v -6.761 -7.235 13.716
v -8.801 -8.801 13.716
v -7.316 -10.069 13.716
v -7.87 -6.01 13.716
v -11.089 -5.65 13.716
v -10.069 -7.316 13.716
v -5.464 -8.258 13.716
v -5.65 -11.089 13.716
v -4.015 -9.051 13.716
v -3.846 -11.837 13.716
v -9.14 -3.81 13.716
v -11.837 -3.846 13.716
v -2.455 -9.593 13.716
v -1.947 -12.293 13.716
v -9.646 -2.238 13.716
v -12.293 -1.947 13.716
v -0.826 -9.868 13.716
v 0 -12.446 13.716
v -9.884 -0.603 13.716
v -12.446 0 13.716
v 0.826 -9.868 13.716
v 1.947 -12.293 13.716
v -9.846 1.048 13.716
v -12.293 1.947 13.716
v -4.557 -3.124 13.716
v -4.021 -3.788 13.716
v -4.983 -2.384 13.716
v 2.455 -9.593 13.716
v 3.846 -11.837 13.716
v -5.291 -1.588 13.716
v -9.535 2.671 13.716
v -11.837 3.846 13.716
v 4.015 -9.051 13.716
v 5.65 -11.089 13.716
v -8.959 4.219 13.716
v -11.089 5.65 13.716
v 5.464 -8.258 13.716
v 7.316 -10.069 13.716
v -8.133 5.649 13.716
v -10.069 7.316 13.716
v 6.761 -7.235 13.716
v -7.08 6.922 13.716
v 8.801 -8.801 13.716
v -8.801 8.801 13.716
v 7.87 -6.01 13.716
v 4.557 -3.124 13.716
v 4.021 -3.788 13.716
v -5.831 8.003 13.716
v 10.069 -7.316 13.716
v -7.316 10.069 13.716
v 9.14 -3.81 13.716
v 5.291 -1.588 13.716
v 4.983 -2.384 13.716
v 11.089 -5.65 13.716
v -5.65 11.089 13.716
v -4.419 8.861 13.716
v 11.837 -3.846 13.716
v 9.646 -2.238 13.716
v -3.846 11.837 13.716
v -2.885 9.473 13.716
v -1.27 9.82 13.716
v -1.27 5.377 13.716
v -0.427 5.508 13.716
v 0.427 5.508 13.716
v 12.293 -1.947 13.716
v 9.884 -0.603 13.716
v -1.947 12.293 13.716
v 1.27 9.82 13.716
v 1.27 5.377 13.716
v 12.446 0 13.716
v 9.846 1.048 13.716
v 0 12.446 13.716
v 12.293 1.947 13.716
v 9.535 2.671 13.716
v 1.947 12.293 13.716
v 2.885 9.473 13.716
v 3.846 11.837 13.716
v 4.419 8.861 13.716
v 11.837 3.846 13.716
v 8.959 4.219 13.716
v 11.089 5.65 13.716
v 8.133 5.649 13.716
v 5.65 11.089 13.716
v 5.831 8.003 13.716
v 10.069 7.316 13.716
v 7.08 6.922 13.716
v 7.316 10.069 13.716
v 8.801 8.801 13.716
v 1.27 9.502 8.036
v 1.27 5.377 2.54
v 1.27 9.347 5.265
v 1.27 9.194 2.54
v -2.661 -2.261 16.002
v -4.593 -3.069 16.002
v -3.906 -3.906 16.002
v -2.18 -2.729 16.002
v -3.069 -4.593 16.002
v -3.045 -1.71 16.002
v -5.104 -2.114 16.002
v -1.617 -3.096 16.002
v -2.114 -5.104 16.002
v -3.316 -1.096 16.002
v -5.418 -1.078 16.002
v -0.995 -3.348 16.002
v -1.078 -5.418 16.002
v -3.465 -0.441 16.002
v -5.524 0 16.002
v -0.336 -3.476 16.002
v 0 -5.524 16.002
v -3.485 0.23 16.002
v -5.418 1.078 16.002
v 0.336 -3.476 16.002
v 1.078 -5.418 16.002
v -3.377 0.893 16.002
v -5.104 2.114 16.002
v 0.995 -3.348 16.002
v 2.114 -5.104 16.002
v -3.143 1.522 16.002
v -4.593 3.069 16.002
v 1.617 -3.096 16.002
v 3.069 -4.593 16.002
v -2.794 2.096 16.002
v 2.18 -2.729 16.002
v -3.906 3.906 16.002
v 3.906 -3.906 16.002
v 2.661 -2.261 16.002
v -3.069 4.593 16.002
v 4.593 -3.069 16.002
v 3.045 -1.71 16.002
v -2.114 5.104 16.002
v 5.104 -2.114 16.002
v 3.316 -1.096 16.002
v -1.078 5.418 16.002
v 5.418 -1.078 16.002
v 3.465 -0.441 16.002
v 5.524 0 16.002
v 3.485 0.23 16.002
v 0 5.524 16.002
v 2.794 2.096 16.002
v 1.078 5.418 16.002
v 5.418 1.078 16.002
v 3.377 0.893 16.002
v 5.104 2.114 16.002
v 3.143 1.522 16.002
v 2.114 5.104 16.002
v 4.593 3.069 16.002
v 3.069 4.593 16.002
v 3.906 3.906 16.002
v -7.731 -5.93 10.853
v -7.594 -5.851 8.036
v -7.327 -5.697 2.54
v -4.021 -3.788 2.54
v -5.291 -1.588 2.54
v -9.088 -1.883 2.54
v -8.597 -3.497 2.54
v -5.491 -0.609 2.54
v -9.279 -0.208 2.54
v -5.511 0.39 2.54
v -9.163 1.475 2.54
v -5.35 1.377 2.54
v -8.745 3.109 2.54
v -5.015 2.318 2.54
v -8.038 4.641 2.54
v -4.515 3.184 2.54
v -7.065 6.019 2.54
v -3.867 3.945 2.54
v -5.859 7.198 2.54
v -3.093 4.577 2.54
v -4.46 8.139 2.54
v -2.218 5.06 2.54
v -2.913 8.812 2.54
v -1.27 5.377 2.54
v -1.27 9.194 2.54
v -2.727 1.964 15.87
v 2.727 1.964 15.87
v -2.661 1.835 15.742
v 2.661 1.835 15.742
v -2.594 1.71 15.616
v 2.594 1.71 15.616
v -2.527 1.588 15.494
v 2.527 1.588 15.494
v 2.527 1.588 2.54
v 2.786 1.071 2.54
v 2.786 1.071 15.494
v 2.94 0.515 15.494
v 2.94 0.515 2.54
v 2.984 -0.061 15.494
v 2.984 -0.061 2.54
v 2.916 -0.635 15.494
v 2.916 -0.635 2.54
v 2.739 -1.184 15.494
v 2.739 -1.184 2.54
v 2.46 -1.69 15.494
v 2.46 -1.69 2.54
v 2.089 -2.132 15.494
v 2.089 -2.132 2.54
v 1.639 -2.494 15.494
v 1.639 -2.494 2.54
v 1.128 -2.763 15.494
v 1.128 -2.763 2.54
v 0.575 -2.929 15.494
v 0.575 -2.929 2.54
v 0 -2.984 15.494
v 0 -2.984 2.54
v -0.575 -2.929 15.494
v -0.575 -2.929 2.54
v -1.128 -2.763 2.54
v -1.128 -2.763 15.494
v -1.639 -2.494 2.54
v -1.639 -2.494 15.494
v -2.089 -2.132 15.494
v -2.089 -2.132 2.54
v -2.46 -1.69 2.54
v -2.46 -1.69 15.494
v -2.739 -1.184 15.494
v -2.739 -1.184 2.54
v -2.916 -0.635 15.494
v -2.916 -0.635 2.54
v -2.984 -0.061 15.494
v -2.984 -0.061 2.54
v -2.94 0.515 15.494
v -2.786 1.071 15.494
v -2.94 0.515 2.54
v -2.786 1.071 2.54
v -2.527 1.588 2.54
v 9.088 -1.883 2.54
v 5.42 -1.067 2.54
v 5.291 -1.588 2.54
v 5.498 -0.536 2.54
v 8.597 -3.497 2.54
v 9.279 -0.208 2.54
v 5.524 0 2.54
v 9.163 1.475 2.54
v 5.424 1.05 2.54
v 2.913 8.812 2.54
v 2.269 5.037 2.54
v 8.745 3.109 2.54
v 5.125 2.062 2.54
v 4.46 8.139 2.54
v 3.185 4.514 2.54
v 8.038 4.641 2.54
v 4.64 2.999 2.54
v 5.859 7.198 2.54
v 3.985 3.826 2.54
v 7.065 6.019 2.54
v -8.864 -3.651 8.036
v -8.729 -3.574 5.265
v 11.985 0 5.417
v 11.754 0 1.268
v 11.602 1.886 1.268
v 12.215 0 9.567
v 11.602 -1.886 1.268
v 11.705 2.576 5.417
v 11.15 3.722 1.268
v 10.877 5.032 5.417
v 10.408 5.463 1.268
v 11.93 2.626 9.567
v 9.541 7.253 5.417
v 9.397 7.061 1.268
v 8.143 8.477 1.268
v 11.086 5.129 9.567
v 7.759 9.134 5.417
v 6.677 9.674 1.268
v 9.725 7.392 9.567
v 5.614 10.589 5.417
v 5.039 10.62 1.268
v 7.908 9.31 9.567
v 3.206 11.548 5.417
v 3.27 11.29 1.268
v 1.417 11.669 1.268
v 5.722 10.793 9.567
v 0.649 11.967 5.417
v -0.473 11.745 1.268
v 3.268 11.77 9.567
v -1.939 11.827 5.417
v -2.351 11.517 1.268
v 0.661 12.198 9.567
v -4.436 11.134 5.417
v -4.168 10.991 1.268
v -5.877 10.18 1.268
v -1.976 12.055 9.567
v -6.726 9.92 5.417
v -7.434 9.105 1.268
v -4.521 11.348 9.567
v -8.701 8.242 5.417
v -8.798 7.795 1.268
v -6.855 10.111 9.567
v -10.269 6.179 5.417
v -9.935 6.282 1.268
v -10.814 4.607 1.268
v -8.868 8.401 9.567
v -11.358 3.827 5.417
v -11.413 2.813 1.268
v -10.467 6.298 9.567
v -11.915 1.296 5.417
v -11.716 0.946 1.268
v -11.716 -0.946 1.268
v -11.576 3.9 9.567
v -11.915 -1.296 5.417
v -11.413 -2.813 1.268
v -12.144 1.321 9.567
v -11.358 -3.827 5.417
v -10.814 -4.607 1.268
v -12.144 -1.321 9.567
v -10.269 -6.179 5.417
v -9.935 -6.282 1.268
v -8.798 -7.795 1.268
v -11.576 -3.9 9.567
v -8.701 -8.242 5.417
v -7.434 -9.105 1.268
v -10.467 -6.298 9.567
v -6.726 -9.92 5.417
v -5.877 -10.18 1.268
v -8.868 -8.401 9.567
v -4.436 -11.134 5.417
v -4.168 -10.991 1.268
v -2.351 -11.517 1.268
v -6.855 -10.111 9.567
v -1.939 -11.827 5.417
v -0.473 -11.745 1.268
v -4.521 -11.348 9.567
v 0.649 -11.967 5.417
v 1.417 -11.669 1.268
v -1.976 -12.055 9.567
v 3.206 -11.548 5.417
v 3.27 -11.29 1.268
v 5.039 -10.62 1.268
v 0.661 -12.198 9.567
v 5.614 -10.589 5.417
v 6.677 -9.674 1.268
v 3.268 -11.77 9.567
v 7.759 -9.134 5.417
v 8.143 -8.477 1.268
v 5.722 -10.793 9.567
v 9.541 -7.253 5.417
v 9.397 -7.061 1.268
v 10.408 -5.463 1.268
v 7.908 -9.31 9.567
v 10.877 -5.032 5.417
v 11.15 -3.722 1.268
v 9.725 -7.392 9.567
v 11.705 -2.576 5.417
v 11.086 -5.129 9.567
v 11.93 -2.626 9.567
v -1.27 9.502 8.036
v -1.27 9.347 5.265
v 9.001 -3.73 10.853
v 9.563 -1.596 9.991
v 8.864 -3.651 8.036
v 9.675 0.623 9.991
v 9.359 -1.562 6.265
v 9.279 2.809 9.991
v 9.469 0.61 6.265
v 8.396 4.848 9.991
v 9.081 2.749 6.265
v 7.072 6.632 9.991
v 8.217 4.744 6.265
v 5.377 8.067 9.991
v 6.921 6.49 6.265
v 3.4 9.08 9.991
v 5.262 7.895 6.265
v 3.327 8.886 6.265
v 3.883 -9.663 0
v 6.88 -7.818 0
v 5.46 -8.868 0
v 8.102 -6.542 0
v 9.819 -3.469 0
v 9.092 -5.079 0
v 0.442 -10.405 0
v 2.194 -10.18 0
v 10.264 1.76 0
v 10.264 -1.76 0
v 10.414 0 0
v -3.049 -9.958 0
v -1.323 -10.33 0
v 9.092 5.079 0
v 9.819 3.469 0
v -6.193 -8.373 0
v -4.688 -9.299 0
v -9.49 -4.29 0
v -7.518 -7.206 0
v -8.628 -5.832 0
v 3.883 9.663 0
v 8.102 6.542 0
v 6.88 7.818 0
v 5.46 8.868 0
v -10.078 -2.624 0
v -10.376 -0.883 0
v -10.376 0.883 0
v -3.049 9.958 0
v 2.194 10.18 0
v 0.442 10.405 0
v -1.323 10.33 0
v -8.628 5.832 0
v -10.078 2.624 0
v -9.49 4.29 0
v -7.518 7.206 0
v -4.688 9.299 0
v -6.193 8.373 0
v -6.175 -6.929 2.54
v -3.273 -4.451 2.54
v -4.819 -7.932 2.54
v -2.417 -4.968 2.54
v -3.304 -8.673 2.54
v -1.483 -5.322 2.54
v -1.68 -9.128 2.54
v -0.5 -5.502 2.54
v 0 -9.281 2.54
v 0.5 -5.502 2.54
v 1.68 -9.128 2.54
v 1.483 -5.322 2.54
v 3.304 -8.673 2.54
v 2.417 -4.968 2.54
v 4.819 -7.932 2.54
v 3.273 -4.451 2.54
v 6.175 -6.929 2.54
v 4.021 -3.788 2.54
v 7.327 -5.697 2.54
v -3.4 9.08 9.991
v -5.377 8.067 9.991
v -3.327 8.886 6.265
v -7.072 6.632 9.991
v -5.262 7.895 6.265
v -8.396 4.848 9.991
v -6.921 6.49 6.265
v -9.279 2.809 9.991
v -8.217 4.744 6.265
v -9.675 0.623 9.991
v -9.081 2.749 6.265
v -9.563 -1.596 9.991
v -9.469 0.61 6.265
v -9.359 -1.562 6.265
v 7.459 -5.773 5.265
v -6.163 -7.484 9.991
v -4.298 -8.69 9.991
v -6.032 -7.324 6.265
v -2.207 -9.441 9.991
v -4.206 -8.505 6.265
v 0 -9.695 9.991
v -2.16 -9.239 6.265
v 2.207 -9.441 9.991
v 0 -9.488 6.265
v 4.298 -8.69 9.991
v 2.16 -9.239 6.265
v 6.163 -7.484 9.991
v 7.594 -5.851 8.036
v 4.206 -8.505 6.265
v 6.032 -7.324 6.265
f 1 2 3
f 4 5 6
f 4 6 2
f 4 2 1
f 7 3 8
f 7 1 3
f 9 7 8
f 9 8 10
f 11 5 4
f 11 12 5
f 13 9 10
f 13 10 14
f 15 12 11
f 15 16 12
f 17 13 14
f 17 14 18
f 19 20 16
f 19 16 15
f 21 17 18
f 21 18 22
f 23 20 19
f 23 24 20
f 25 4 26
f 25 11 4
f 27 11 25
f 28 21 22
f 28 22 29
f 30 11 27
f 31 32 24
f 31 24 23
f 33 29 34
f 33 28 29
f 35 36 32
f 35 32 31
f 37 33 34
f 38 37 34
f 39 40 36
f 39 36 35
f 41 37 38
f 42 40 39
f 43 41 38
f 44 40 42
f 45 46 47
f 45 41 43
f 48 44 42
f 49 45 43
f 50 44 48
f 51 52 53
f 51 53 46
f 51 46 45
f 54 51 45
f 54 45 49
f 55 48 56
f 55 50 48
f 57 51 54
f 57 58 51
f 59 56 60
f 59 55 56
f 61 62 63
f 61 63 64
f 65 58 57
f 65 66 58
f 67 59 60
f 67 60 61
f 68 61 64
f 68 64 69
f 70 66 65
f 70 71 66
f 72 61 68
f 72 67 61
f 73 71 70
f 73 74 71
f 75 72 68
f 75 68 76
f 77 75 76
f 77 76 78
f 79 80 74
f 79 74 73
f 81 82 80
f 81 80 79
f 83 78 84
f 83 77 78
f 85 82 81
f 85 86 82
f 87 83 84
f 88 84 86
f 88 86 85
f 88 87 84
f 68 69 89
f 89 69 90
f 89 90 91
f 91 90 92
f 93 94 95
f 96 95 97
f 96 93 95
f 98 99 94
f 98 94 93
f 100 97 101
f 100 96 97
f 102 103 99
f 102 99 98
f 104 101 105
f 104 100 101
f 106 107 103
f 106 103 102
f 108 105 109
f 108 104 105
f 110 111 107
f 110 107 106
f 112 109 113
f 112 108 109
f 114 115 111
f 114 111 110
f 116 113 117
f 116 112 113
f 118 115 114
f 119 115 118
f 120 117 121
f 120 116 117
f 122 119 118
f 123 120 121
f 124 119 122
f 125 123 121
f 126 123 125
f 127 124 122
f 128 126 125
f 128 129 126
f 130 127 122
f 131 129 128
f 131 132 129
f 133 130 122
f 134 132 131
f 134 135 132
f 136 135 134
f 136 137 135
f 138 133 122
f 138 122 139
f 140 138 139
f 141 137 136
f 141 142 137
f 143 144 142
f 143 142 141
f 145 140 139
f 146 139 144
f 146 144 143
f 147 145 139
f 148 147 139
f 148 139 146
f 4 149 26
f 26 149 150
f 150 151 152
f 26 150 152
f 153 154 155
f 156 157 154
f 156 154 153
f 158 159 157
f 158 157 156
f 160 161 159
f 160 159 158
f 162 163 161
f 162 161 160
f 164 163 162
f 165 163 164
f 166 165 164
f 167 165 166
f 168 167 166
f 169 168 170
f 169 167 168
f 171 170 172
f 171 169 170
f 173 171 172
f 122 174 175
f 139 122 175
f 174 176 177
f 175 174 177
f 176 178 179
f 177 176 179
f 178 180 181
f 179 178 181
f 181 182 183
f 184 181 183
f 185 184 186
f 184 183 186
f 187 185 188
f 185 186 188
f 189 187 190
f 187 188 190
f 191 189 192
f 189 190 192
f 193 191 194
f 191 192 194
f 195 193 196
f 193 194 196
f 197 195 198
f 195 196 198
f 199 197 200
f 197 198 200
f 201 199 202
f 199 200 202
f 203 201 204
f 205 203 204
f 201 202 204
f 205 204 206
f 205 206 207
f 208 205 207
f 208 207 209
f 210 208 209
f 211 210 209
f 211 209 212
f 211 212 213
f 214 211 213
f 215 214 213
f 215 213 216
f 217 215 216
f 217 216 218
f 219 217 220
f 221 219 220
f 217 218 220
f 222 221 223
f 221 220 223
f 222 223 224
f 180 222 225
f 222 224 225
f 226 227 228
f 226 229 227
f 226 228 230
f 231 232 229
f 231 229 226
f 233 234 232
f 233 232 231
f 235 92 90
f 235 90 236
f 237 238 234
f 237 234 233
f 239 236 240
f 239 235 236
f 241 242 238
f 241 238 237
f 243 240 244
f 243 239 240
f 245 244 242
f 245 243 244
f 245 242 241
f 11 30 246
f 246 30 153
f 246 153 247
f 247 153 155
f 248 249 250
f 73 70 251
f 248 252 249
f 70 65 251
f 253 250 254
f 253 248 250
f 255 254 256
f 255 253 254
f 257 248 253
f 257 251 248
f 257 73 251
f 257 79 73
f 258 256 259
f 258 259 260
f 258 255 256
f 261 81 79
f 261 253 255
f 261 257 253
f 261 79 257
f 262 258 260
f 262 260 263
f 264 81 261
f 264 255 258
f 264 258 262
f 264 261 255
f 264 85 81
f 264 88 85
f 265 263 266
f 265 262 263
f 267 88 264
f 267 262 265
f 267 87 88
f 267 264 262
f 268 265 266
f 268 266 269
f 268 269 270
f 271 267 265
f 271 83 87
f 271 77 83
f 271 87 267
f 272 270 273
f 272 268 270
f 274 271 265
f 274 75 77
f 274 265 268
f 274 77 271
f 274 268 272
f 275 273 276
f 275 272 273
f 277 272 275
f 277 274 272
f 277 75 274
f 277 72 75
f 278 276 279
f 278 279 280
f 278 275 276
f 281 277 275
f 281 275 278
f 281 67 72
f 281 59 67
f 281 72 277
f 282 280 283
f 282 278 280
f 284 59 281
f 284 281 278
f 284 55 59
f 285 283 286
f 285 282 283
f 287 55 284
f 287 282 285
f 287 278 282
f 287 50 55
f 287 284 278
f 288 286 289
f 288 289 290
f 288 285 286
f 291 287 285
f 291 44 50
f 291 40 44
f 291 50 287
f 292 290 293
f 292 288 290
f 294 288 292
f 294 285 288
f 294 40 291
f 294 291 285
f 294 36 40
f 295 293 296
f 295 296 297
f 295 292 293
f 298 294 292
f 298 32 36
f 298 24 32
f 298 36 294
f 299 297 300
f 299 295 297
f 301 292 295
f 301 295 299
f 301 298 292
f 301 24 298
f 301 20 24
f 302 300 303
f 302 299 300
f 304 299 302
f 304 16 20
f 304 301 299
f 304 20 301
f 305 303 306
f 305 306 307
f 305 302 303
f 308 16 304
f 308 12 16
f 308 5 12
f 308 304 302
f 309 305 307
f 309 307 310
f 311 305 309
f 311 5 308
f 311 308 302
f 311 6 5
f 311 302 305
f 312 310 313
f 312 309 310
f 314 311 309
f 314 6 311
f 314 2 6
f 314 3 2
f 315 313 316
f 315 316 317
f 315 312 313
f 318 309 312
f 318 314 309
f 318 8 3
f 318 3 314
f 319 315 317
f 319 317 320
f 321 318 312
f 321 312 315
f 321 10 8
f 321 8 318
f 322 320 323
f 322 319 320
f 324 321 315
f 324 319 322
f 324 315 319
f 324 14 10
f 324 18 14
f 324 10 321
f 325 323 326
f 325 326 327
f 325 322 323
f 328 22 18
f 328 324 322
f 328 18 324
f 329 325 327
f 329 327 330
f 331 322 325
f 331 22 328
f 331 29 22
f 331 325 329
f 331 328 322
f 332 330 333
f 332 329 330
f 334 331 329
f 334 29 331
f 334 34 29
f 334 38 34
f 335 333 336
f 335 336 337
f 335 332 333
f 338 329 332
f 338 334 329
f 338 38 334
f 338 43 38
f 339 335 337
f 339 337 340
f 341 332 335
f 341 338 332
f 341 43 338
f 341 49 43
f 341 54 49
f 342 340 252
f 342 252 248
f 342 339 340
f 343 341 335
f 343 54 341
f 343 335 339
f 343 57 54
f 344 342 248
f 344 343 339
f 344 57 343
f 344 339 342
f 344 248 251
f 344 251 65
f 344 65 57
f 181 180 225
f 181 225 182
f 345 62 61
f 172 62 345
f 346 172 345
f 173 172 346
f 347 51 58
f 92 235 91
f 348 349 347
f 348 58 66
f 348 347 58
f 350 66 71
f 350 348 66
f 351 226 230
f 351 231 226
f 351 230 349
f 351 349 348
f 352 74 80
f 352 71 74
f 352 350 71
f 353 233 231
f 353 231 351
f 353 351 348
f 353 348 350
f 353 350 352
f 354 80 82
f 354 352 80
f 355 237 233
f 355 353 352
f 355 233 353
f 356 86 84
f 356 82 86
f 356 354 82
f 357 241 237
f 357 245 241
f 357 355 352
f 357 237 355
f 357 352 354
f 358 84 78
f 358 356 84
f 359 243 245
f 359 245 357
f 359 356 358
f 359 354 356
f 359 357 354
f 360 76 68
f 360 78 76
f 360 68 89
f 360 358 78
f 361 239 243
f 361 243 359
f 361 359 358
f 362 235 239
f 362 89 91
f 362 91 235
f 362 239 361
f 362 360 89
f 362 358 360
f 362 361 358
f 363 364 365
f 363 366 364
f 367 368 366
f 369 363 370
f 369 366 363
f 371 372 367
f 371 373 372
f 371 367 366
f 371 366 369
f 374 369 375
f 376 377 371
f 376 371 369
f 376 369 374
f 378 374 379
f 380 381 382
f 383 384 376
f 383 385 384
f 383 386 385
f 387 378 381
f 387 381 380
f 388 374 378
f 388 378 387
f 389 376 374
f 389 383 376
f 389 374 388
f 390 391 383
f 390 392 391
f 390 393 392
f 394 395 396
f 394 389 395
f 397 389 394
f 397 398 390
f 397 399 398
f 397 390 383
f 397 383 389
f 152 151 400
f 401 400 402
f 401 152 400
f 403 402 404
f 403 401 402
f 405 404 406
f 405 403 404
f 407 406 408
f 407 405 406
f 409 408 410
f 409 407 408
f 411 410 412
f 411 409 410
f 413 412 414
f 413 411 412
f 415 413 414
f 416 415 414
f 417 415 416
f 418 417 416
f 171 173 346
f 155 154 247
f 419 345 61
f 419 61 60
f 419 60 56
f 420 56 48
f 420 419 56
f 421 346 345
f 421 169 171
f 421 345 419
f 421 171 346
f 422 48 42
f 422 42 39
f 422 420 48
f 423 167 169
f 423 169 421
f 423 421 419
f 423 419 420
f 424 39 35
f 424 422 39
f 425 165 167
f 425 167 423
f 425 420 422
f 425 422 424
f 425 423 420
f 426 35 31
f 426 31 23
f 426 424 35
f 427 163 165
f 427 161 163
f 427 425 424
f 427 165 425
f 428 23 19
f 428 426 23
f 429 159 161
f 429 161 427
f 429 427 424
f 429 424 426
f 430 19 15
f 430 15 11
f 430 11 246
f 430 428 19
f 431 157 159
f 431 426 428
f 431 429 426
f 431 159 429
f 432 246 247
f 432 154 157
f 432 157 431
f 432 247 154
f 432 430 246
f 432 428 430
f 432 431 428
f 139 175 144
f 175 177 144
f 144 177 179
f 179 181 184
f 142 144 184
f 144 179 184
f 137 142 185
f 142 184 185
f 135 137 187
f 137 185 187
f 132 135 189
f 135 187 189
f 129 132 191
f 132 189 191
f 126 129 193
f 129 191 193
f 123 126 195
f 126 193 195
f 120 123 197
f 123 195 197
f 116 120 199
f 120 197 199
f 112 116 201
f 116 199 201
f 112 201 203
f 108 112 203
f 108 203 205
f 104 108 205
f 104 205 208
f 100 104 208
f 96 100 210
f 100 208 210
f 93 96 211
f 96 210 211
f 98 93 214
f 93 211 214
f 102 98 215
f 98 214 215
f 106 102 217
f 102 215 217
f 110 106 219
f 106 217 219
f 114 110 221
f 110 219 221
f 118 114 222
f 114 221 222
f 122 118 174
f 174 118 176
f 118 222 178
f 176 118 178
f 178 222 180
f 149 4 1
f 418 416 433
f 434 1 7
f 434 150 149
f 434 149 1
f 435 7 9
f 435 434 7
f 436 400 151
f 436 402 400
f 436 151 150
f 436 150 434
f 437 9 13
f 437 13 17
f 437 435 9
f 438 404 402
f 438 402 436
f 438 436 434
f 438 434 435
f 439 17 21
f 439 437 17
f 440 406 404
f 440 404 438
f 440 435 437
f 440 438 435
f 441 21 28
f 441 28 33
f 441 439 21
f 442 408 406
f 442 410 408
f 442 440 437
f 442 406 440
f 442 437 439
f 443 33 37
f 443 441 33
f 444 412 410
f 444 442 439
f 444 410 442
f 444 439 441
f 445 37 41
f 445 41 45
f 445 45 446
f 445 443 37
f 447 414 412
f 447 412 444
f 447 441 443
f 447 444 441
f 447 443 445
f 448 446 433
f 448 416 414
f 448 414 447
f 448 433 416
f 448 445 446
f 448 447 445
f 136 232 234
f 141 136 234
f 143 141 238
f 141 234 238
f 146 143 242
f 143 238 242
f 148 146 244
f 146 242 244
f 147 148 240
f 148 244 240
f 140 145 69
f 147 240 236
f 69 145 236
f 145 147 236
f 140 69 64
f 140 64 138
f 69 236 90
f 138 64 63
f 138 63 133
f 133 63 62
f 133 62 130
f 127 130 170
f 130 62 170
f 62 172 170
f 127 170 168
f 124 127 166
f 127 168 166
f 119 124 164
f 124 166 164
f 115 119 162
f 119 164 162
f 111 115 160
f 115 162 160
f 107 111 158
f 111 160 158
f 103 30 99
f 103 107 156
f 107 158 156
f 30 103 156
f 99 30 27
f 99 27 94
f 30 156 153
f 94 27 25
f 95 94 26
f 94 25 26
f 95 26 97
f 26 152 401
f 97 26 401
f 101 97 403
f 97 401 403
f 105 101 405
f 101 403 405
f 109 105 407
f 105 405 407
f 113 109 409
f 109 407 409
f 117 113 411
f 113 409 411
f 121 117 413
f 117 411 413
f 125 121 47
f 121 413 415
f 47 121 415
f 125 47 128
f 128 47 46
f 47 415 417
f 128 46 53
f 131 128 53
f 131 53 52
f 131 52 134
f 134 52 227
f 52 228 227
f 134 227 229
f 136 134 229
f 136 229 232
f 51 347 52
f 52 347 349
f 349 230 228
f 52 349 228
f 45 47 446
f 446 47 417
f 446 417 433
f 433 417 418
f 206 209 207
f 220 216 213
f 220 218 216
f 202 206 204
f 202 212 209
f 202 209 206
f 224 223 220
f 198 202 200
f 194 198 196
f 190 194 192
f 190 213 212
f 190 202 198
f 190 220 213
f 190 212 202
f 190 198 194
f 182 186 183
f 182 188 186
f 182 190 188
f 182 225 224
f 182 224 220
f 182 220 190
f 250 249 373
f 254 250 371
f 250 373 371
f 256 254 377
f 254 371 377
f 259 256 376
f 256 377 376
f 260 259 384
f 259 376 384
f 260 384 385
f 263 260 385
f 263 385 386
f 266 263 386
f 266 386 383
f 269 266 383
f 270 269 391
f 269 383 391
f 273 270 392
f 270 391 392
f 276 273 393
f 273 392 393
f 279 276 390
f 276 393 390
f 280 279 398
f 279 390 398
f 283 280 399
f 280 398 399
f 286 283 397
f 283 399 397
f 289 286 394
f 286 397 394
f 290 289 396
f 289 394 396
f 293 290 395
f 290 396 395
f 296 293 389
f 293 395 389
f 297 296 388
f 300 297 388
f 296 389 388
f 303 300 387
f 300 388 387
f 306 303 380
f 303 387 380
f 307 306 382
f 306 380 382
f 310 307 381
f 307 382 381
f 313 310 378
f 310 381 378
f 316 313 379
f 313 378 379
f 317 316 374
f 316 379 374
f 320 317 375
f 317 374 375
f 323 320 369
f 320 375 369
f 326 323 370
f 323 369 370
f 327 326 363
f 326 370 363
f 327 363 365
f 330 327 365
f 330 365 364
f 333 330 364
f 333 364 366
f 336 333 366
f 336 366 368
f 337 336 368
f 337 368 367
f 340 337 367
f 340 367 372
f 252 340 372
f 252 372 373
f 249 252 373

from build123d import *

# Parameters (mm, degrees)
F2_R     = 5.5245
F3_DEPTH = 13.462
F4_W     = 2.54
F4_H     = 5.842
F5_DEPTH = 11.176
F6_SIZE  = 0.508
F7_SIZE  = 1.27


with BuildPart() as f1:
    # F0 (on Front) → F1 (revolve)
    with BuildSketch(Plane.XZ):
        Polygon((0, 2.54), (0, 0), (11.684, 0), (12.446, 13.716), (9.902083, 13.716), (9.281194, 2.54), align=None)
    revolve(axis=Axis((0, 0, 1.27), (0, 0, 1)))

    # F2 (on face) → F3 (join)
    with BuildSketch(Plane.XY.offset(2.54)):
        Circle(F2_R)
        with BuildLine():
            ThreePointArc((2.527179, 1.587642), (0, -2.9845), (-2.527179, 1.587642))
            Line((-2.527179, 1.587642), (2.527179, 1.587642))
        make_face(mode=Mode.SUBTRACT)
    extrude(amount=F3_DEPTH)

    # F4 (on face) → F5 (join, through all)
    with BuildSketch(Plane.XY.offset(2.54)):
        with Locations((0, 8.001)):
            Rectangle(F4_W, F4_H)
        Polygon((-10.093729, -4.361148), (-8.823729, -6.560852), (-3.764409, -3.639852), (-5.034409, -1.440148), align=None)
        Polygon((8.823729, -6.560852), (10.093729, -4.361148), (5.034409, -1.440148), (3.764409, -3.639852), align=None)
    extrude(amount=F5_DEPTH)

    # F6
    f6_edges = [f1.edges().sort_by_distance(p)[0] for p in [
        (0, 1.587642, 16.002),
        (0, -2.9845, 16.002),
    ]]
    chamfer(f6_edges, length=F6_SIZE)

    # F7
    f7_edges = [f1.edges().sort_by_distance(p)[0] for p in [
        (-11.684, 0, 0),
    ]]
    chamfer(f7_edges, length=F7_SIZE)


solid = f1.part
